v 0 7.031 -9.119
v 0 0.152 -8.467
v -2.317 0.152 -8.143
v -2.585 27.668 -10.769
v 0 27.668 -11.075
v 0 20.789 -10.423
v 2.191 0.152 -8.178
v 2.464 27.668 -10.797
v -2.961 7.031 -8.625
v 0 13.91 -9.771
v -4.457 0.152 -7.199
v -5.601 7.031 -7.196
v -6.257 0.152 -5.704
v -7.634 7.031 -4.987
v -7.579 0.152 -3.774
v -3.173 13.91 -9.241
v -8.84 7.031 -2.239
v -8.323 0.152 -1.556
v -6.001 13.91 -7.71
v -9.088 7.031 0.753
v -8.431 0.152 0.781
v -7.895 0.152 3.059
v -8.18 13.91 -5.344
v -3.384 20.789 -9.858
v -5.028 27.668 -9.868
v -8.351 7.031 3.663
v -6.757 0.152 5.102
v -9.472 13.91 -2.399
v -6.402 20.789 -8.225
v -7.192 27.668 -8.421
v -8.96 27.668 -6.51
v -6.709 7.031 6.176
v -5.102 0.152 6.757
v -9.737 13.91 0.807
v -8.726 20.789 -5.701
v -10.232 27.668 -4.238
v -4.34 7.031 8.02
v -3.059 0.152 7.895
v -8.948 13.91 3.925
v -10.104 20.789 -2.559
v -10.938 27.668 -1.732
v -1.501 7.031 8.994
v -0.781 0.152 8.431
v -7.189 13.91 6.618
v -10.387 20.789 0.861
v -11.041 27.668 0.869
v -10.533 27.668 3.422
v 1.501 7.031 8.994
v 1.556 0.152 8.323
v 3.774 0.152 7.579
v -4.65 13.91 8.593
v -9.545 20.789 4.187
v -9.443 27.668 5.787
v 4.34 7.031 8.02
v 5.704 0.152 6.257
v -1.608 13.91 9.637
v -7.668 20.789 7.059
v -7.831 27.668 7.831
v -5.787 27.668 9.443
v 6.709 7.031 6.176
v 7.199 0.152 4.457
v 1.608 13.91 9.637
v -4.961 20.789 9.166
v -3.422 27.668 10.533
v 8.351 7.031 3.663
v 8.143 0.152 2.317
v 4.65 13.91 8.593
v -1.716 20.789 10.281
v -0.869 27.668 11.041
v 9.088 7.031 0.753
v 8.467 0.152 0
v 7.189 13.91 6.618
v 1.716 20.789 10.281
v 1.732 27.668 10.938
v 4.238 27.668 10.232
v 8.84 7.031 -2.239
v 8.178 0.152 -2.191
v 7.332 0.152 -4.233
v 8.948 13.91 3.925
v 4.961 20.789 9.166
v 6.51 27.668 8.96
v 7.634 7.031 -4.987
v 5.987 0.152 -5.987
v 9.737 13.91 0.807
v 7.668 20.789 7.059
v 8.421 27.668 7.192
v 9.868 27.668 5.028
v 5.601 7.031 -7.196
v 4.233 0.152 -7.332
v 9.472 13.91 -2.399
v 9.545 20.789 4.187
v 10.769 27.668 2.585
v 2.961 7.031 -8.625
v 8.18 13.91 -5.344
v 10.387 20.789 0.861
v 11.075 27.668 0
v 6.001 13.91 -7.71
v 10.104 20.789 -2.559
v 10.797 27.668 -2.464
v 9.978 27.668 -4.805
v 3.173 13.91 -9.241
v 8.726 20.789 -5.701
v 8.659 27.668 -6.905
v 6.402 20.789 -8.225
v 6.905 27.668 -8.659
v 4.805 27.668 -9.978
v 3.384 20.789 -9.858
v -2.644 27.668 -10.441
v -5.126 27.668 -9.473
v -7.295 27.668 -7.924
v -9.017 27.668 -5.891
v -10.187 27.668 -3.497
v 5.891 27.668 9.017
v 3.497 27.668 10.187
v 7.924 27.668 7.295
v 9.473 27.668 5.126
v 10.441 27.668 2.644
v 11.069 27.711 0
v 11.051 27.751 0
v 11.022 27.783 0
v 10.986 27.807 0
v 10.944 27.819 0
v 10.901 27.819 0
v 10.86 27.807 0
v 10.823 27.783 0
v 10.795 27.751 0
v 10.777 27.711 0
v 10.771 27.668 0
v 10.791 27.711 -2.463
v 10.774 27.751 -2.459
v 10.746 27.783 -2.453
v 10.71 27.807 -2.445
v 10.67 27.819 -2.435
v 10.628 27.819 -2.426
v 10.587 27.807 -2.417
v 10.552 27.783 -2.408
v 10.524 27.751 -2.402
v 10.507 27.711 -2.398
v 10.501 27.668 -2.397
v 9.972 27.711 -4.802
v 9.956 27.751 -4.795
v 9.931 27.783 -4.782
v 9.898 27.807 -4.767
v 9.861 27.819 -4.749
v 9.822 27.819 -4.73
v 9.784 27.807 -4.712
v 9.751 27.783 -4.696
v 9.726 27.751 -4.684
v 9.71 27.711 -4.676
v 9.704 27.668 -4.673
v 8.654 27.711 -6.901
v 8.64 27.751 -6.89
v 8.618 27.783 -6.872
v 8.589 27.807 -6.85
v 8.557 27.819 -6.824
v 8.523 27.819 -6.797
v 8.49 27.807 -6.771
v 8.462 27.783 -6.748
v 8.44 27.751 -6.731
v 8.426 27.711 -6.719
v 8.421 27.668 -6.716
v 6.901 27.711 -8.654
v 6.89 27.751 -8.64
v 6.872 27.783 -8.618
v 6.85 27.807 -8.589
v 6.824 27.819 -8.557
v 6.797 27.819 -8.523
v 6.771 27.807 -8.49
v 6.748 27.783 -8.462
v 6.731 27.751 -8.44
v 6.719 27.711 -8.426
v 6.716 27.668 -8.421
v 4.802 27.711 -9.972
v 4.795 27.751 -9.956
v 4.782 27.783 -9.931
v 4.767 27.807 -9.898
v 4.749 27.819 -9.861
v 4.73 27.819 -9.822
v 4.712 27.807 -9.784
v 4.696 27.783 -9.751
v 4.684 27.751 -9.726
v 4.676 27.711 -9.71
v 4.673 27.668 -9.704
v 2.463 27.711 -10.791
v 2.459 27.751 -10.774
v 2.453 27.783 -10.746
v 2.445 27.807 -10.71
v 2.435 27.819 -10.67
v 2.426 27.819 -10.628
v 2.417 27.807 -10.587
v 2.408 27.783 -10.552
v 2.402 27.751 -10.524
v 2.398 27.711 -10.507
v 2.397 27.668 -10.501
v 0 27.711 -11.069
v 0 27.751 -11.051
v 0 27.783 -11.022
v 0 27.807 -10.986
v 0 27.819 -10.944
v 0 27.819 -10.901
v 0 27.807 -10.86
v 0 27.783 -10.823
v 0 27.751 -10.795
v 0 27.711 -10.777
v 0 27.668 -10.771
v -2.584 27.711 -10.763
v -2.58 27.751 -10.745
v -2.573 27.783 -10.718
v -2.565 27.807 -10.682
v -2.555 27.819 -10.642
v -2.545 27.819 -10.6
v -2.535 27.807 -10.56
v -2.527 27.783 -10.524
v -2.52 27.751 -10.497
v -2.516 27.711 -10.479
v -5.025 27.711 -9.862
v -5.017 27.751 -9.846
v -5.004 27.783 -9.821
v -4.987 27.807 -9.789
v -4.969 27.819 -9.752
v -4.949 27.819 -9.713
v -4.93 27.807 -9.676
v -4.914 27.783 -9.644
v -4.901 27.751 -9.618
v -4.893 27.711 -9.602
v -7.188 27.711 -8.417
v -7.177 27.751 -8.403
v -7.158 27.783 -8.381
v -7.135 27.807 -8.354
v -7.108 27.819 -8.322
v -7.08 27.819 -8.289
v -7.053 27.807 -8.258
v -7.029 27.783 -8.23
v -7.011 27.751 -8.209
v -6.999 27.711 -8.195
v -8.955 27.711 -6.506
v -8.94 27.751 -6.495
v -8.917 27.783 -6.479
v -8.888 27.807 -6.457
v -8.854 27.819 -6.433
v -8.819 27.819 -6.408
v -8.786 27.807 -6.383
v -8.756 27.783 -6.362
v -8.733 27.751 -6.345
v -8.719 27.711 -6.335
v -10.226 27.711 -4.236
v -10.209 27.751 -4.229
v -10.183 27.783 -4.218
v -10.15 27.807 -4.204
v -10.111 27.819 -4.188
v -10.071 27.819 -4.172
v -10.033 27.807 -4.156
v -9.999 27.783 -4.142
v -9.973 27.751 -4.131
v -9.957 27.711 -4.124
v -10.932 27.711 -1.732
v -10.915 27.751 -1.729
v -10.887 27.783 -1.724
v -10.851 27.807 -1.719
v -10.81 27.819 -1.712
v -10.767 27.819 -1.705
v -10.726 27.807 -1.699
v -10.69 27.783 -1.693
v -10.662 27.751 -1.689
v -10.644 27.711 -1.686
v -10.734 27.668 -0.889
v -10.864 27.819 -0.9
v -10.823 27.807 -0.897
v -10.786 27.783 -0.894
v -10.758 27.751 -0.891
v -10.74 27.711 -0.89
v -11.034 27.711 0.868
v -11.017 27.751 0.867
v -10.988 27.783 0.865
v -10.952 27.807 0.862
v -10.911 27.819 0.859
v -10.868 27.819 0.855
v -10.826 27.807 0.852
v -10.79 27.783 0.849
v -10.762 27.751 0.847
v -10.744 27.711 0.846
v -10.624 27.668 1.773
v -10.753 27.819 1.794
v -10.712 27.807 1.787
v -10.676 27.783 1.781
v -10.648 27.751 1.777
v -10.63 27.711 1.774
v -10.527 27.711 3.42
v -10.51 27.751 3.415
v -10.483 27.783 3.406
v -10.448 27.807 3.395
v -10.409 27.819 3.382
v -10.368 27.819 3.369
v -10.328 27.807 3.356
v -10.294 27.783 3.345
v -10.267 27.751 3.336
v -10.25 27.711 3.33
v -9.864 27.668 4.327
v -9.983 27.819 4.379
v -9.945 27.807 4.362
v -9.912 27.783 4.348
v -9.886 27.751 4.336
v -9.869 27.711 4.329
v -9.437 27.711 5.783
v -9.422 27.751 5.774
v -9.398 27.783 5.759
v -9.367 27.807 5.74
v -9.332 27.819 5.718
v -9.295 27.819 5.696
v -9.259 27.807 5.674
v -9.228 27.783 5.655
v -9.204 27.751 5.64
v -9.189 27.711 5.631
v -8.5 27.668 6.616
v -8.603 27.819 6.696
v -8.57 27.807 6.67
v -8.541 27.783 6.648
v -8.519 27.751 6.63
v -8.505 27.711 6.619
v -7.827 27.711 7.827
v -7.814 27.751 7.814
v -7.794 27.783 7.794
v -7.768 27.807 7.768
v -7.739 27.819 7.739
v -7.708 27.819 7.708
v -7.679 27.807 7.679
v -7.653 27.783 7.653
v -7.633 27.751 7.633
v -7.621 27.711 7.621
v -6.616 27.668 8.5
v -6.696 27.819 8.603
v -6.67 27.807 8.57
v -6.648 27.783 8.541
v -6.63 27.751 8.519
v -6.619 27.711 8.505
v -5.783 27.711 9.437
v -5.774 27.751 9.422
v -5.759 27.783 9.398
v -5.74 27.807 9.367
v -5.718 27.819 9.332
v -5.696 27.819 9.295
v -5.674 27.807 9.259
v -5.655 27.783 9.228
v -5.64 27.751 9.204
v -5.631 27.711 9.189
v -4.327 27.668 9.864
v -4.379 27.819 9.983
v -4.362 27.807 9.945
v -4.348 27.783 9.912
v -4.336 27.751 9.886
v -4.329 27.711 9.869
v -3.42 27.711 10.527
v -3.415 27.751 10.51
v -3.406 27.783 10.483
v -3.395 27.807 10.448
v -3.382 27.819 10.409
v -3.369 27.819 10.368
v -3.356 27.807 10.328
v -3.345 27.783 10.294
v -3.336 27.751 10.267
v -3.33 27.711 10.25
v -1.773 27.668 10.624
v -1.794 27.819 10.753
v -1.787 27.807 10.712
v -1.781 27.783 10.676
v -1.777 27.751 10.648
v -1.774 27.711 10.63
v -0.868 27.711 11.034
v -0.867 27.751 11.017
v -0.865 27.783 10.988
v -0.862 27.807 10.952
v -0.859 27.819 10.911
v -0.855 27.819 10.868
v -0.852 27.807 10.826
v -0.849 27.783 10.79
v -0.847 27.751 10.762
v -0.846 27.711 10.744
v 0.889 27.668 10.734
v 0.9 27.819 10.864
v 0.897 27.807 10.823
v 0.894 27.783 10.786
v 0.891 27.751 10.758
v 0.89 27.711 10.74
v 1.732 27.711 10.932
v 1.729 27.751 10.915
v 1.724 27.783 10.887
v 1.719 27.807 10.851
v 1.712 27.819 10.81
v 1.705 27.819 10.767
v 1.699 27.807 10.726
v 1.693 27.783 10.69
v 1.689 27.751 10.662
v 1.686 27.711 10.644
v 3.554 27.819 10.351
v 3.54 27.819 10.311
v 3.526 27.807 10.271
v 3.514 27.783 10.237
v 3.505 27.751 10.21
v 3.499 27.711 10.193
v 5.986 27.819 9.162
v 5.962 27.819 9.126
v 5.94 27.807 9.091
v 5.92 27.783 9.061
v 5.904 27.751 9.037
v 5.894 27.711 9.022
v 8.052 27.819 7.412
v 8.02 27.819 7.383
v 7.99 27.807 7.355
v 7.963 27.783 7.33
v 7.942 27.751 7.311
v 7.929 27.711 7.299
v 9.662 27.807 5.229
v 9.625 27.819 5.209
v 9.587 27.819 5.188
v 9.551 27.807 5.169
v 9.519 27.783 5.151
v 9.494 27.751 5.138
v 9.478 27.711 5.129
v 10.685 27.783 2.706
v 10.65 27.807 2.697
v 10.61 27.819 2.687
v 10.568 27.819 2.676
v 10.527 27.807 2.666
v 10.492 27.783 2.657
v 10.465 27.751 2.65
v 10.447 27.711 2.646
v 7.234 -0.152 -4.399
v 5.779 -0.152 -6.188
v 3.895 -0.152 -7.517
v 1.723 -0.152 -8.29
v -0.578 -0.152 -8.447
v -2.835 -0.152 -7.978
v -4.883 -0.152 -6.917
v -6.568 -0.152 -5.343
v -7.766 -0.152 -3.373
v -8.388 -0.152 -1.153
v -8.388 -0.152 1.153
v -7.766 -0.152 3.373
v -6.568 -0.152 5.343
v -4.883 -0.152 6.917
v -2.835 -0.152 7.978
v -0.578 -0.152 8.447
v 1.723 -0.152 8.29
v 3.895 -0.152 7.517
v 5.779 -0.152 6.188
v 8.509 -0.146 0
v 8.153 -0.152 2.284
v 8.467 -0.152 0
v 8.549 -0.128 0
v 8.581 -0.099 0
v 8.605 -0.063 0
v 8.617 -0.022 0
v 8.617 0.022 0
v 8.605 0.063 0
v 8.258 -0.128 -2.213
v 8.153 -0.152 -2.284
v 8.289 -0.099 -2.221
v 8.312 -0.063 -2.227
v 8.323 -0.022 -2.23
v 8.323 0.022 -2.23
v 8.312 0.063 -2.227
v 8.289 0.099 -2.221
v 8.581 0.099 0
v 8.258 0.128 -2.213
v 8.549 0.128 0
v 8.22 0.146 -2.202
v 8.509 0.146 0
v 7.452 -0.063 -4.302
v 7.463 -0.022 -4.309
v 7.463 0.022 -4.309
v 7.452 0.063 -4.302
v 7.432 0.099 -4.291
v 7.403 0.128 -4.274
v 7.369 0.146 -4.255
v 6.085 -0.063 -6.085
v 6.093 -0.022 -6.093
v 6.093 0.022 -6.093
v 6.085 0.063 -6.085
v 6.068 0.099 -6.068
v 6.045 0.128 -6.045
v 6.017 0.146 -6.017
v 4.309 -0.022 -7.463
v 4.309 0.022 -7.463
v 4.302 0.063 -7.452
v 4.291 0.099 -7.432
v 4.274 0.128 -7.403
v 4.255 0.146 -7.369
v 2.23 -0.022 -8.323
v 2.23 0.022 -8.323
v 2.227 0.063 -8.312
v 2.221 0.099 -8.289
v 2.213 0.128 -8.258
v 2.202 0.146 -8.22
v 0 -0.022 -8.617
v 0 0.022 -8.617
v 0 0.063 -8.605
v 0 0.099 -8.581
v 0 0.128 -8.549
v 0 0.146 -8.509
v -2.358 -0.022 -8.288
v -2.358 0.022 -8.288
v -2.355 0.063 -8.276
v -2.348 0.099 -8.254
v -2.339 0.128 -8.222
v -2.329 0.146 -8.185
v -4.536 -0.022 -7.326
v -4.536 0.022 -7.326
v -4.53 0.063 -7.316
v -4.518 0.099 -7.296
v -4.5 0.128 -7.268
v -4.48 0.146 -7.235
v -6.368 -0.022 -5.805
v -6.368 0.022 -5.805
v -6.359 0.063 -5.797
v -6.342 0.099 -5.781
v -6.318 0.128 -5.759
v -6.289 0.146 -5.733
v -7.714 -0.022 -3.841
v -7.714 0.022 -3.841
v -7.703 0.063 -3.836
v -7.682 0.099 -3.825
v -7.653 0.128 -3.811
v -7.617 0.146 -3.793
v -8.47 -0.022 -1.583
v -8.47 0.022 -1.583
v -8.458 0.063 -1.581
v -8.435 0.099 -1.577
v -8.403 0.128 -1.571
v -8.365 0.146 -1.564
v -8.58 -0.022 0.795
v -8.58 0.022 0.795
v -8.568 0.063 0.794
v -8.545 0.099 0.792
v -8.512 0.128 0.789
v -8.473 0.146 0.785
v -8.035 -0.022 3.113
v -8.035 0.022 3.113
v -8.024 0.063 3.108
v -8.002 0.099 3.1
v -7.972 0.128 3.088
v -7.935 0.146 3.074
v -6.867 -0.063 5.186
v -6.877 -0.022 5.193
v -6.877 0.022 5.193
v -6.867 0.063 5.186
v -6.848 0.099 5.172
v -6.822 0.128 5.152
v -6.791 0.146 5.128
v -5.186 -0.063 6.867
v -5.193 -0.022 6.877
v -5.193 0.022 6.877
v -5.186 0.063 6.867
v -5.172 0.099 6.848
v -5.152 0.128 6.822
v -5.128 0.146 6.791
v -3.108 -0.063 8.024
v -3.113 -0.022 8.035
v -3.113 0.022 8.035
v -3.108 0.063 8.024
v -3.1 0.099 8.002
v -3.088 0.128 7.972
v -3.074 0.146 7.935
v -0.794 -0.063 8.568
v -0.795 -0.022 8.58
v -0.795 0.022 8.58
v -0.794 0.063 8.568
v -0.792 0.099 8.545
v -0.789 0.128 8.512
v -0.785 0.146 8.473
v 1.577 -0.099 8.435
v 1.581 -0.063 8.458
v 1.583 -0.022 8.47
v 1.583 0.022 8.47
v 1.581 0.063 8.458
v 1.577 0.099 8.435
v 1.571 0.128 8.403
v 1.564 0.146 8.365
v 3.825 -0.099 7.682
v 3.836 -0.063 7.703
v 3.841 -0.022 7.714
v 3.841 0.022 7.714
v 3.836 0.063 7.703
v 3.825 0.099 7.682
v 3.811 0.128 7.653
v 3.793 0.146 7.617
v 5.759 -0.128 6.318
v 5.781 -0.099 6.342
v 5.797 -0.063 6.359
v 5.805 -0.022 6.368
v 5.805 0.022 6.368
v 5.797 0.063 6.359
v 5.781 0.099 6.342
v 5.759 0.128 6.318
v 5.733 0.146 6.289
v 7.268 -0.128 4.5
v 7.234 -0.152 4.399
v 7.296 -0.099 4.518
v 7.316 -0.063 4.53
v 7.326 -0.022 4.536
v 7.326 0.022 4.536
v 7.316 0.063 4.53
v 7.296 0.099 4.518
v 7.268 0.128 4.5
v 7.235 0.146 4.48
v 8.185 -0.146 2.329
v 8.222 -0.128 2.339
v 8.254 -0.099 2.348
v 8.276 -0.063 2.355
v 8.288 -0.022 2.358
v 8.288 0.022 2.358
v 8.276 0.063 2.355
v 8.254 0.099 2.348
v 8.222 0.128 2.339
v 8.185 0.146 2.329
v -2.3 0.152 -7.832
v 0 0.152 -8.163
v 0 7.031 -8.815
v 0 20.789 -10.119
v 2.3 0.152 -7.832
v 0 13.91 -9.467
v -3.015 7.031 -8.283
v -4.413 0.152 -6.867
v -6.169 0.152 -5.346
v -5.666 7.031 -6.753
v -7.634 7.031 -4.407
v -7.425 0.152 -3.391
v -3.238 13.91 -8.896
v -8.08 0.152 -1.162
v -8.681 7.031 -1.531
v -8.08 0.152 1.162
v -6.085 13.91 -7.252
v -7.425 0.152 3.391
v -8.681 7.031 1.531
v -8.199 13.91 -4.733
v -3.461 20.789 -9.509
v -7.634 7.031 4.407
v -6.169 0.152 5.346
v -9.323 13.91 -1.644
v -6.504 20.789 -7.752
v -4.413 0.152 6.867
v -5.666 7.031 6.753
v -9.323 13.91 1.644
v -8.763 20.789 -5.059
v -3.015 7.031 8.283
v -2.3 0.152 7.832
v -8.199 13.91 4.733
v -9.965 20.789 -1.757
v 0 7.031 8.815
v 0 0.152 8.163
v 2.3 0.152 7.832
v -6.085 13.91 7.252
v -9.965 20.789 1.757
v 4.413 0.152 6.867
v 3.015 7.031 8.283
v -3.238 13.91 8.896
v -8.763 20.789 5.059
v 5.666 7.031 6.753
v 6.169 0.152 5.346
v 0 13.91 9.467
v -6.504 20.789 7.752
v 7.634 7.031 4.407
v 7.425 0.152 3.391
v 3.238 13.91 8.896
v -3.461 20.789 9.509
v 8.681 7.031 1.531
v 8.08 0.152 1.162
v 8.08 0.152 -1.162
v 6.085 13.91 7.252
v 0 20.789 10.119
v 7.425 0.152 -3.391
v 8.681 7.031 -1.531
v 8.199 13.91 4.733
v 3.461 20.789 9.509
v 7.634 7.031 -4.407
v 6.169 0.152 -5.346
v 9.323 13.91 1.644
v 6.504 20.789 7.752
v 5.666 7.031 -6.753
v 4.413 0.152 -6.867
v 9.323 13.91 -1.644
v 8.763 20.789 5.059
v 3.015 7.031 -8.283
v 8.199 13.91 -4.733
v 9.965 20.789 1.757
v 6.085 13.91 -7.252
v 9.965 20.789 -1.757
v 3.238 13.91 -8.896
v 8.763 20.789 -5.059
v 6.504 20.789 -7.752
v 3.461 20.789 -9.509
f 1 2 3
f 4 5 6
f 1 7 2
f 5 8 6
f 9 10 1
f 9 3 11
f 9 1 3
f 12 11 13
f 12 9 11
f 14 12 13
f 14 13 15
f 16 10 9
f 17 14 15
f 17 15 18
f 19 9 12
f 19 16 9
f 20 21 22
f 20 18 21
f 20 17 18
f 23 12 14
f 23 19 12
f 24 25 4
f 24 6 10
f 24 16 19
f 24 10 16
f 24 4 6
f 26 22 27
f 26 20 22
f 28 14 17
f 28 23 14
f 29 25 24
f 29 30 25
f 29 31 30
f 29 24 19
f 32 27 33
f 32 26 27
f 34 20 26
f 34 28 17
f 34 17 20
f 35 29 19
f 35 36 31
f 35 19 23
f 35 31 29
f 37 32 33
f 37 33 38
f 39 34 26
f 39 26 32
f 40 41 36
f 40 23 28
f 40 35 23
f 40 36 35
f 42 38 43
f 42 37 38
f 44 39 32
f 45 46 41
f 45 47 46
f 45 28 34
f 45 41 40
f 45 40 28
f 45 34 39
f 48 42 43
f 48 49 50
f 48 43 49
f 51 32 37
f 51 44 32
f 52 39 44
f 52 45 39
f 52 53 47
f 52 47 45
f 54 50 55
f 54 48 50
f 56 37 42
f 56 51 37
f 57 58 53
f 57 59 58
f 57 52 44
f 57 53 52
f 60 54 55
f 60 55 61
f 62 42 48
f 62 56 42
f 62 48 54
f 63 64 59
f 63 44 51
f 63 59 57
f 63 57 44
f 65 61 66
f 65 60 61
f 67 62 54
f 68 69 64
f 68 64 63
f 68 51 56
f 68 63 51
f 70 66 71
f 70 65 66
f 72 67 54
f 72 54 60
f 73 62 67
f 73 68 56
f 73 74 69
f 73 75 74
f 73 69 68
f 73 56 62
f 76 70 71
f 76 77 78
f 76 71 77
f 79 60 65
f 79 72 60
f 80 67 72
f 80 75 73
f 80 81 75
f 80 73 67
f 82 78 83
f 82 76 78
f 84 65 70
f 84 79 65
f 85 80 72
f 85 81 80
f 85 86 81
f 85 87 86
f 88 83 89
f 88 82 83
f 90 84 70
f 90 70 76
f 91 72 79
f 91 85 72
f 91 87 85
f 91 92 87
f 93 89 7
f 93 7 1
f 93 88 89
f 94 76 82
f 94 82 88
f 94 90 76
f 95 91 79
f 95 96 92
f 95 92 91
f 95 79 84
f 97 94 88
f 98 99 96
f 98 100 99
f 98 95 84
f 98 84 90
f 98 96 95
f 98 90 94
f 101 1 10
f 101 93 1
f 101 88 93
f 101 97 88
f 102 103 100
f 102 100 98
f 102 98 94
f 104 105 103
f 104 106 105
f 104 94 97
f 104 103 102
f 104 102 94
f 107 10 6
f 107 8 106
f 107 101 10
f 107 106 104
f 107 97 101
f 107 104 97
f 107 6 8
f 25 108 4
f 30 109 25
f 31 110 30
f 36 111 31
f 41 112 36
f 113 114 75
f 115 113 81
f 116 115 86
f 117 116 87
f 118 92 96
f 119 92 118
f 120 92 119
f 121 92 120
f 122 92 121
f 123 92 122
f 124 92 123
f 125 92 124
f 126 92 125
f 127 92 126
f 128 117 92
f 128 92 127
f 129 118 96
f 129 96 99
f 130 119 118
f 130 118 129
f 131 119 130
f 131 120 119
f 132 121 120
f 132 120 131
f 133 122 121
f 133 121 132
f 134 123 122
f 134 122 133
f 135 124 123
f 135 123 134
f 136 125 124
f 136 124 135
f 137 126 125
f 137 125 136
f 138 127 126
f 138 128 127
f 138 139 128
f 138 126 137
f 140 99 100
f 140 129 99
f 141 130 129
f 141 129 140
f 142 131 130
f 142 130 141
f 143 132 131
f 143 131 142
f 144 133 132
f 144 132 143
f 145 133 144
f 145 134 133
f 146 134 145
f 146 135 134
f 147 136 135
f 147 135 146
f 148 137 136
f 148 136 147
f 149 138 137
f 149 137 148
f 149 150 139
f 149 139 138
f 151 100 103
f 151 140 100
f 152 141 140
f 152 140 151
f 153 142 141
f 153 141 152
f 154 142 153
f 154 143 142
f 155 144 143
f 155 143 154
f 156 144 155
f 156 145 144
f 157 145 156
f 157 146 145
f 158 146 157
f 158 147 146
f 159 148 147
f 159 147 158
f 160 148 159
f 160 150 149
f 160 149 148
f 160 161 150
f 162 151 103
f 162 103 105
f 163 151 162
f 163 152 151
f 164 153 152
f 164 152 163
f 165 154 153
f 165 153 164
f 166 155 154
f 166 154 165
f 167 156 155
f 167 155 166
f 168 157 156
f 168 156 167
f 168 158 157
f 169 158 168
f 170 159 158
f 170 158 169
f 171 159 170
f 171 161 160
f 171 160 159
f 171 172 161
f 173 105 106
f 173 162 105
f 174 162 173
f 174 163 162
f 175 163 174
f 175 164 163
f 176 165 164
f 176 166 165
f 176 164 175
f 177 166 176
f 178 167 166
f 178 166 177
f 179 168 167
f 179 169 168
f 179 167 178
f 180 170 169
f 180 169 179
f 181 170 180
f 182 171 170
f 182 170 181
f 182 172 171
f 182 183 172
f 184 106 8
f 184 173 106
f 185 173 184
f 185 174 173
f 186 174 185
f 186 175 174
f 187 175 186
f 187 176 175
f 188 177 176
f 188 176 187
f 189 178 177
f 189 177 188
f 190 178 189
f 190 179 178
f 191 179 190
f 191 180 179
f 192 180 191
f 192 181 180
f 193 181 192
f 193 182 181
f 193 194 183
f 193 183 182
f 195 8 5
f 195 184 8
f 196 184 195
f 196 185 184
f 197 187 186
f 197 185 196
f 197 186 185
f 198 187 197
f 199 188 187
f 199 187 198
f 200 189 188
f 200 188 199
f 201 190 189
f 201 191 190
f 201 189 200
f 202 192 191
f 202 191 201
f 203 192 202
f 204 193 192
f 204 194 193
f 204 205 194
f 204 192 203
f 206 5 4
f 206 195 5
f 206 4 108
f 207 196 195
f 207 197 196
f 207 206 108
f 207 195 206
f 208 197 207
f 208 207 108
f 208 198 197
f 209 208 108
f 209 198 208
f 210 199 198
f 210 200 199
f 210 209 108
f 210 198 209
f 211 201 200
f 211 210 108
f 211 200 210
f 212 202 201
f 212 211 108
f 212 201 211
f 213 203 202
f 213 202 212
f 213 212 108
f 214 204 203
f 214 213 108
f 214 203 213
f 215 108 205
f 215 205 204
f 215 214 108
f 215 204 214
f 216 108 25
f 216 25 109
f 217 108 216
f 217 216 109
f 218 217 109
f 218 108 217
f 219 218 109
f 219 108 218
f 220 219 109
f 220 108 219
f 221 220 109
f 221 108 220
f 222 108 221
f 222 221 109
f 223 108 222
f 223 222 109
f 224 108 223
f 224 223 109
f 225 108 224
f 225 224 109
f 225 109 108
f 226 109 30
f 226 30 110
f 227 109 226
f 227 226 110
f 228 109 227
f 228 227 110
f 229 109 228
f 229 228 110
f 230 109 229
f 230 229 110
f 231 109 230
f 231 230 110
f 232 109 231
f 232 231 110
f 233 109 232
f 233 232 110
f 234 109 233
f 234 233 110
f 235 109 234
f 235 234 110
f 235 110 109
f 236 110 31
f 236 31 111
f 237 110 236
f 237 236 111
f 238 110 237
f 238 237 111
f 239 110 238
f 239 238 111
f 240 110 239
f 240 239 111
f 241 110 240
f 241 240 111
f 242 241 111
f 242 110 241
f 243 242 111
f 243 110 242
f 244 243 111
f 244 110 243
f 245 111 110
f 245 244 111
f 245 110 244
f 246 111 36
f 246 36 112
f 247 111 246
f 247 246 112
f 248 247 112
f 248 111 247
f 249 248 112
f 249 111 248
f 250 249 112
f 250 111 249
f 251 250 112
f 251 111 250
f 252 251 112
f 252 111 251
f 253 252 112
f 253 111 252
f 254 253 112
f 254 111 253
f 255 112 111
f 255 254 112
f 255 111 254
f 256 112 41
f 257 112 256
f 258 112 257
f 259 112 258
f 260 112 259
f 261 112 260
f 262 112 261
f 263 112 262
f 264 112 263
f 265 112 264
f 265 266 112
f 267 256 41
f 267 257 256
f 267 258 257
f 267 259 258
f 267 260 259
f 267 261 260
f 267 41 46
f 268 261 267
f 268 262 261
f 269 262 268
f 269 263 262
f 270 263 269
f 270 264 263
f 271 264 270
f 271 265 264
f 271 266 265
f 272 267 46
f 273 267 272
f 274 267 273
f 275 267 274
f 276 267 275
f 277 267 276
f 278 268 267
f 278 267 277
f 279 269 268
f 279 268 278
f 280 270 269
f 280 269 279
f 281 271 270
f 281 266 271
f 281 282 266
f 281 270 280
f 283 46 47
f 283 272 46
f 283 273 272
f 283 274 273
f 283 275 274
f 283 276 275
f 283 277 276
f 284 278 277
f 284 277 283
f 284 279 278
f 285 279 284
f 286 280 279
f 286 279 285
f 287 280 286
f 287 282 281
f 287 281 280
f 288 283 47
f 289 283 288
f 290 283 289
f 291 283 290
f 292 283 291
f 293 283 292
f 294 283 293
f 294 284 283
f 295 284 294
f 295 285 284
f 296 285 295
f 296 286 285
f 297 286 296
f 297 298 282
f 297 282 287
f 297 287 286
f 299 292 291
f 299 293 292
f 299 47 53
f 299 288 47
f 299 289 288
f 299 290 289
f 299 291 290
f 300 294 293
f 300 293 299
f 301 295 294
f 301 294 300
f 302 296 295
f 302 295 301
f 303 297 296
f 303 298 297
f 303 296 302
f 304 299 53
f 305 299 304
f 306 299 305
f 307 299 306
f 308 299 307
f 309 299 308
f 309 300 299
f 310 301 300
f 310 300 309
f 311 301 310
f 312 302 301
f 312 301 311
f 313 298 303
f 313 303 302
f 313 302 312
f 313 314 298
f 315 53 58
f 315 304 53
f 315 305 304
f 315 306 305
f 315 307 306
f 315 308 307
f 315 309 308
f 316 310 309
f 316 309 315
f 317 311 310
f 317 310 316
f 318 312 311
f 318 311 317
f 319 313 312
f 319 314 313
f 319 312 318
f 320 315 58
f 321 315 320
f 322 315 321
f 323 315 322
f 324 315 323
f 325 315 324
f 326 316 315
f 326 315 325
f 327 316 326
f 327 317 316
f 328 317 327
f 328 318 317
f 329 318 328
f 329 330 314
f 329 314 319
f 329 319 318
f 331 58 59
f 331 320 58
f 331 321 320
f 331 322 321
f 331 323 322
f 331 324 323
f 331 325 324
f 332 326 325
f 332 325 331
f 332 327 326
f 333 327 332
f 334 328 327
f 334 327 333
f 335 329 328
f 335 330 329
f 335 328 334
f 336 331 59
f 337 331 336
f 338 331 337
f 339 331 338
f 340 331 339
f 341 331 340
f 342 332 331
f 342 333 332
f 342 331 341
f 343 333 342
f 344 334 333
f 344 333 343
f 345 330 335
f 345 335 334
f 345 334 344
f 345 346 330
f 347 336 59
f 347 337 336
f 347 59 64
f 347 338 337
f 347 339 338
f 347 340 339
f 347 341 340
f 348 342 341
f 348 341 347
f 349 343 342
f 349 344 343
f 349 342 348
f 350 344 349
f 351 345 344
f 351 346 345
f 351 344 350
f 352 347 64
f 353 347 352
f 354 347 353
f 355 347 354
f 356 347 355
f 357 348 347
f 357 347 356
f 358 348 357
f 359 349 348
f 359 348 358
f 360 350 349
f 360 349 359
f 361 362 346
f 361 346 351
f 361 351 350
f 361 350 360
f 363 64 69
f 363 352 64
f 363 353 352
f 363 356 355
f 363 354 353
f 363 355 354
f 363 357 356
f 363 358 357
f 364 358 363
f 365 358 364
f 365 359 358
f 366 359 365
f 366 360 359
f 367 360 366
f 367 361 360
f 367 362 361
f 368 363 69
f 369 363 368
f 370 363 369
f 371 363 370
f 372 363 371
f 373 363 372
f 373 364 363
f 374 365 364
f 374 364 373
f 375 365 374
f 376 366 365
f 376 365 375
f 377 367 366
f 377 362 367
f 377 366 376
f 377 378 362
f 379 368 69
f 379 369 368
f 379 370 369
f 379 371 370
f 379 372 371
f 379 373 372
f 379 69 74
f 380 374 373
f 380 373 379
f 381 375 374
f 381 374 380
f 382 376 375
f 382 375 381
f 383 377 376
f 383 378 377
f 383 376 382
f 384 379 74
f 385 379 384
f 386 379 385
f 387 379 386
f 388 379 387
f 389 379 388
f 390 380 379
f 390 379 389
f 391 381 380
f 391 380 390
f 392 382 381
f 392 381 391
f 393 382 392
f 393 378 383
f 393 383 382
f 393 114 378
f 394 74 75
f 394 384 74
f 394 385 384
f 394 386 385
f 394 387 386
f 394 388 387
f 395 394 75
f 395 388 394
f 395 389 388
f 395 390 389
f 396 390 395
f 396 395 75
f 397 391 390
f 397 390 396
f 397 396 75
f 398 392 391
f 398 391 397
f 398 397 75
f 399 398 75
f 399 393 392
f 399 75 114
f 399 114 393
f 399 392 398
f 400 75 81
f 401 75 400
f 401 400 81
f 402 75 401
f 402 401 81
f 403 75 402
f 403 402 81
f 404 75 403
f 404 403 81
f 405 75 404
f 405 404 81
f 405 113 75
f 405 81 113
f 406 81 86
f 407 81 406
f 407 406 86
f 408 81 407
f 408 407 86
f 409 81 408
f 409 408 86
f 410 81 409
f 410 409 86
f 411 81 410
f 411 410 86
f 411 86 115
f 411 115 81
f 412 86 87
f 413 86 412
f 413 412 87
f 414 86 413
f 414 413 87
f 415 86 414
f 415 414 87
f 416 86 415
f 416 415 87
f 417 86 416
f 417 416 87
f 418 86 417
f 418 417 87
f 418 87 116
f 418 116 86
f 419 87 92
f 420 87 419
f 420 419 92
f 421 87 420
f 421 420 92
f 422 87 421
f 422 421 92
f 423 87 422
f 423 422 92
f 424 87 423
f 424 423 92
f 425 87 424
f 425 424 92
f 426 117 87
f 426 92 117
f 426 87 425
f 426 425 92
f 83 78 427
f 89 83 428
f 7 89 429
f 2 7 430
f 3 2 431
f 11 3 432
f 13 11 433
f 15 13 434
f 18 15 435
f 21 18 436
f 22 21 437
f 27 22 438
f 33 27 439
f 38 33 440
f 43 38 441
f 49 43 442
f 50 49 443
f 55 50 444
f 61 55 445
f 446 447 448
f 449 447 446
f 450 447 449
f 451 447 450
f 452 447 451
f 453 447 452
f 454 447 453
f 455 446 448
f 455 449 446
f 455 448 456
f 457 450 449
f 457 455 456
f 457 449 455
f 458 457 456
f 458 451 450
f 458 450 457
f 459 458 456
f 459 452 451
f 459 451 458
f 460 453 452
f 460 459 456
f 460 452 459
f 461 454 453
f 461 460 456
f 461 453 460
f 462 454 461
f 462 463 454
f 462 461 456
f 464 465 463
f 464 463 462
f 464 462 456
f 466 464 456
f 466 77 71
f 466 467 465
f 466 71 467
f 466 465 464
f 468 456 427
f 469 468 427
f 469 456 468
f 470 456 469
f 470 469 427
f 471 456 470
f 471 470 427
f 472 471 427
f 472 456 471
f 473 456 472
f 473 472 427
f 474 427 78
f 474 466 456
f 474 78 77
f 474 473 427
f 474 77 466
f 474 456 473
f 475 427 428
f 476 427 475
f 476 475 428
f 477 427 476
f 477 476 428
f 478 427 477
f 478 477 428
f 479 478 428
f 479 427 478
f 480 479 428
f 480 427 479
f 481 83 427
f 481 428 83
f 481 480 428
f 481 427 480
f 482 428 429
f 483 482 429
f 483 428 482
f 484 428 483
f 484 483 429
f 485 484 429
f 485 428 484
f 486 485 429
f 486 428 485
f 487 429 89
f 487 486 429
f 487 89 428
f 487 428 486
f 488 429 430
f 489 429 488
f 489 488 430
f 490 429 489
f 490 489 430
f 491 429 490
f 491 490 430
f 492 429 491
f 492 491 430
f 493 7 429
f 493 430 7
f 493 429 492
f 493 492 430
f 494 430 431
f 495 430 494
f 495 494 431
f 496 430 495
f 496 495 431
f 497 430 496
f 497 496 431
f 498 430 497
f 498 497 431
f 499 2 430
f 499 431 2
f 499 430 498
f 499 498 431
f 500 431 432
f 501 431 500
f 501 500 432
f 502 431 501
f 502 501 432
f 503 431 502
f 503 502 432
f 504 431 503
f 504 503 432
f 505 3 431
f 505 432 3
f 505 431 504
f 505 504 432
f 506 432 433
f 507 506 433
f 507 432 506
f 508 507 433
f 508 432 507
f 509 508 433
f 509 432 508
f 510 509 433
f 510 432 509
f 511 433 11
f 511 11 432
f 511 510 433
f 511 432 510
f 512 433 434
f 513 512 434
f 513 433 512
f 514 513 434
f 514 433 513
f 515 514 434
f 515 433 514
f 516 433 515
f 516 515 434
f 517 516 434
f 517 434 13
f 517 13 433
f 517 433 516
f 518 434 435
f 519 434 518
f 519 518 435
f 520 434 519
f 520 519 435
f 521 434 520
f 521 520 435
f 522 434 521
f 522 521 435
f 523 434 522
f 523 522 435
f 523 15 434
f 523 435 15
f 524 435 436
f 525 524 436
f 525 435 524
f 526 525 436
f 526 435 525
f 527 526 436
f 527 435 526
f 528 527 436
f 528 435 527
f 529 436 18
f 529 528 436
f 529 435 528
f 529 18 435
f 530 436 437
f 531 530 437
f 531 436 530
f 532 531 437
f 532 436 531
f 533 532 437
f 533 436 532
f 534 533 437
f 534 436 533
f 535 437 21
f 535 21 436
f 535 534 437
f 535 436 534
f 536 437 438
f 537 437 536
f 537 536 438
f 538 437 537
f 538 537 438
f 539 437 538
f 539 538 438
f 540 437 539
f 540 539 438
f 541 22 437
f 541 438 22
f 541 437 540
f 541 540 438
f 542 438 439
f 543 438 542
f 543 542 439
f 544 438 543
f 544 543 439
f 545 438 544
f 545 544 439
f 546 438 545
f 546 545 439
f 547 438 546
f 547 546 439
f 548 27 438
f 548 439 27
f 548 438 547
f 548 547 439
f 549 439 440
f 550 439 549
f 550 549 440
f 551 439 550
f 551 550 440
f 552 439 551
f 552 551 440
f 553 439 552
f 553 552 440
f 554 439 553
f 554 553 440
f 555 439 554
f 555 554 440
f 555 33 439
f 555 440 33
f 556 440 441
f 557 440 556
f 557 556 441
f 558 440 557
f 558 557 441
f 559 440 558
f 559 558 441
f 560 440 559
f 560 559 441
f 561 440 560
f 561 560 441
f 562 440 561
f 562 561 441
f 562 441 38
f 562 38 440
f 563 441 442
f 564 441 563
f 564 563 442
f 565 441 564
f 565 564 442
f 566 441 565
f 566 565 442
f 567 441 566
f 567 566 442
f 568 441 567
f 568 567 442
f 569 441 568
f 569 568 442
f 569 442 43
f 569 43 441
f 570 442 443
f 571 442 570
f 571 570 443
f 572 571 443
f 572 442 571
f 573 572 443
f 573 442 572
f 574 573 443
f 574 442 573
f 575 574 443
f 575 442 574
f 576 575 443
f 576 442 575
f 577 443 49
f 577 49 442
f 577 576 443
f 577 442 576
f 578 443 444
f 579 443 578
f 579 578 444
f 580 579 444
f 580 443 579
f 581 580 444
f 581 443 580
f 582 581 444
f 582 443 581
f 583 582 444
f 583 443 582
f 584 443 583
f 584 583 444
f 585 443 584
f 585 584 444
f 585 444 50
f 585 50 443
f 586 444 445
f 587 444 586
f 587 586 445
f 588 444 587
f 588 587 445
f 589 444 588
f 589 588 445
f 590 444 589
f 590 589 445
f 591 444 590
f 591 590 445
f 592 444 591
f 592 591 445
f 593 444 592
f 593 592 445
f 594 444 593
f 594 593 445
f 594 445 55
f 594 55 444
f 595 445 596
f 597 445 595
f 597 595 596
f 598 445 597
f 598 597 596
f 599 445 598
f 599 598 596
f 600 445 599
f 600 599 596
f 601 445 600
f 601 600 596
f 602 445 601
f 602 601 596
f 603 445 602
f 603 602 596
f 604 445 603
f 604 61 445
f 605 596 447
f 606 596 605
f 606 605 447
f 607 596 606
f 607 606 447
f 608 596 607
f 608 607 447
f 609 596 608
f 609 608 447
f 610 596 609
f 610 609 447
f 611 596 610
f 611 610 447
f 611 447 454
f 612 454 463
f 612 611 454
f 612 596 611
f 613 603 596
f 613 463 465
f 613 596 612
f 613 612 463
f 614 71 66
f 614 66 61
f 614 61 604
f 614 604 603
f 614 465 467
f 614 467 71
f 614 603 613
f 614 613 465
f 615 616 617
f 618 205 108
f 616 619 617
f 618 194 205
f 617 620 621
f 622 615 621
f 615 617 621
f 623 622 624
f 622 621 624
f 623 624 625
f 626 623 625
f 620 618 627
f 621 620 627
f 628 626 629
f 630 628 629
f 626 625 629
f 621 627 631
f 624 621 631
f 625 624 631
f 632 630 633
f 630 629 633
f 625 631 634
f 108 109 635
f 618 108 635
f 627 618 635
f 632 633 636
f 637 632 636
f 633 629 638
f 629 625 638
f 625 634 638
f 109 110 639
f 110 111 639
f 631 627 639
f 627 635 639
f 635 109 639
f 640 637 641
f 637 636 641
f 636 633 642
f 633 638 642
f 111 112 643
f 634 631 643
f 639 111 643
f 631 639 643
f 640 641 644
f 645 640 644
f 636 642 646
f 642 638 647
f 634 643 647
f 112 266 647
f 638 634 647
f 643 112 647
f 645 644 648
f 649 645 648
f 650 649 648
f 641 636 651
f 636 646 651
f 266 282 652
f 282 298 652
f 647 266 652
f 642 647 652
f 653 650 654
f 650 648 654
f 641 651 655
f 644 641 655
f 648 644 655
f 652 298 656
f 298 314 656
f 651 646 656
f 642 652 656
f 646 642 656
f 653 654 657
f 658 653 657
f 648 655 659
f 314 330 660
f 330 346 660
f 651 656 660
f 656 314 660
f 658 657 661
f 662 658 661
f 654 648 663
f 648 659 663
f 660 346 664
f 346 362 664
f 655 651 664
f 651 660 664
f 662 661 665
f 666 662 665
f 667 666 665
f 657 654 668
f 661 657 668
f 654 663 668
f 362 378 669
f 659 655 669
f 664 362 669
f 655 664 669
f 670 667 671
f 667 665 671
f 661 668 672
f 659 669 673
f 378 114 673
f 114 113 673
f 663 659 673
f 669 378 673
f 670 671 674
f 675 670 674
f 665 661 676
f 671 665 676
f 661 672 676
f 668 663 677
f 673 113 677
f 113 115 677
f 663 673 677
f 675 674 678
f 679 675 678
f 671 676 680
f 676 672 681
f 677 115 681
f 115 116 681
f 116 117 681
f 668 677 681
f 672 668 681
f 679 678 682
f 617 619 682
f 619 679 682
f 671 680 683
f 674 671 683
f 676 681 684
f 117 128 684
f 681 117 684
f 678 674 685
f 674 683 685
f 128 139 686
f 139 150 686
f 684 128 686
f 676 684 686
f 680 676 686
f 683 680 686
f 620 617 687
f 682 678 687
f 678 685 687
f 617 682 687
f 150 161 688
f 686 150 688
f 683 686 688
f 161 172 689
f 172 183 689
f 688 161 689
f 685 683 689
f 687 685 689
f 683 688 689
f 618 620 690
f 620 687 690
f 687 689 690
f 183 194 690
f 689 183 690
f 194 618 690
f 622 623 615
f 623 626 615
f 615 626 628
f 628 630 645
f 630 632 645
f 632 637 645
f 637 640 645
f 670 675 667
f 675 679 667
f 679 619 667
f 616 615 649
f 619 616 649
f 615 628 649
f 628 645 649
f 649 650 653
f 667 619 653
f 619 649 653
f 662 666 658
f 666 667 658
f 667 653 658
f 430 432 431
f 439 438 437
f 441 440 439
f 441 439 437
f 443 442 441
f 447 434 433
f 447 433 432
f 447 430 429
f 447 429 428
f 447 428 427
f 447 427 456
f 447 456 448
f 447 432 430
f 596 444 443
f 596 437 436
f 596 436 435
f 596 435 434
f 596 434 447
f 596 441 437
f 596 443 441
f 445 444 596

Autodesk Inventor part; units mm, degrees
ref_plane "YZ Plane" through (0, 0, 0) normal (1, 0, 0) x (0, 1, 0)
ref_plane "XZ Plane" through (0, 0, 0) normal (0, 1, 0) x (-1, 0, 0)
ref_plane "XY Plane" through (0, 0, 0) normal (0, 0, 1) x (1, 0, 0)
sketch "Sketch1" plane through (0, 0, 0) normal (0, 0, 1) x (1, 0, 0)
  line L0 (0, 0) -> (8.4667, 0) construction
  arc A0 (8.4667, -0.1519) -> (8.4667, 0.1519) centre (8.4667, 0) ccw
  line L1 (8.4667, -0.1519) -> (0, -0.1519)
  line L2 (0, -0.1519) -> (0, 0)
  line L3 (8.4667, 0.1519) -> (0, 0.1519)
  line L4 (0, 0.1519) -> (0, 0)
  dimension "d0" = 8.4667
  dimension "d1" = 0.3037
  dimension "d2" = 8.4667
  dimension "d3" = 8.4667
revolve "bace" add sketch "Sketch1" angle 360 about axis through (0, 0.1519, 0) along (0, -1, 0)
sketch "Sketch2" plane through (0, 0, 0) normal (1, 0, 0) x (0, 1, 0)
  line L0 (0.1519, 8.4667) -> (0.1519, -8.4667) projected
  line L1 (0.1519, 0) -> (27.6685, 0)
  line L2 (27.6685, 0) -> (27.6685, -11.0747)
  line L3 (27.6685, -11.0747) -> (0.1519, -8.4667)
  line L4 (27.6685, -11.0747) -> (27.6685, -10.7709)
  line L5 (27.6685, -10.7709) -> (0.1519, -8.1629)
  line L6 (0.1519, -8.4667) -> (0.1519, -8.1629)
  point P0 (0, 0)
  dimension "d5" = 27.5167
  dimension "d6" = 0.3037
  dimension "d7" = 0.3037
revolve "walls" add sketch "Sketch2" angle 360 about axis through (0, 0.1519, 0) along (0, 1, 0) contours L5 L2 L3 L0
sketch "Sketch3" plane through (0, 0, 0) normal (0, 0, 1) x (1, 0, 0)
  line L0 (8.1629, 0.1519) -> (10.7709, 27.6685) projected
  line L1 (10.7709, 27.6685) -> (11.0747, 27.6685) construction
  line L2 (11.0747, 27.6685) -> (8.4667, 0.1519) projected
  line L3 (-11.0747, 27.6685) -> (11.0747, 27.6685) projected
  arc A0 (11.0747, 27.6685) -> (10.7709, 27.6685) centre (10.9228, 27.6685) ccw
  line L4 (0, -5.7418) -> (0, 33.3874) projected
  point P0 (0, 0)
  dimension "d10" = 0.1519
revolve "Revolution3" add sketch "Sketch3" angle 360 about axis through (0, -10, 0) along (0, 1, 0)
equation "\"d2\" = d0"
equation "\"d3\" = d0"
equation "\"d6\" = d1"
equation "\"d10\" = 0.5 * d1"
properties part number "trash bin 13 inches not demanding"
